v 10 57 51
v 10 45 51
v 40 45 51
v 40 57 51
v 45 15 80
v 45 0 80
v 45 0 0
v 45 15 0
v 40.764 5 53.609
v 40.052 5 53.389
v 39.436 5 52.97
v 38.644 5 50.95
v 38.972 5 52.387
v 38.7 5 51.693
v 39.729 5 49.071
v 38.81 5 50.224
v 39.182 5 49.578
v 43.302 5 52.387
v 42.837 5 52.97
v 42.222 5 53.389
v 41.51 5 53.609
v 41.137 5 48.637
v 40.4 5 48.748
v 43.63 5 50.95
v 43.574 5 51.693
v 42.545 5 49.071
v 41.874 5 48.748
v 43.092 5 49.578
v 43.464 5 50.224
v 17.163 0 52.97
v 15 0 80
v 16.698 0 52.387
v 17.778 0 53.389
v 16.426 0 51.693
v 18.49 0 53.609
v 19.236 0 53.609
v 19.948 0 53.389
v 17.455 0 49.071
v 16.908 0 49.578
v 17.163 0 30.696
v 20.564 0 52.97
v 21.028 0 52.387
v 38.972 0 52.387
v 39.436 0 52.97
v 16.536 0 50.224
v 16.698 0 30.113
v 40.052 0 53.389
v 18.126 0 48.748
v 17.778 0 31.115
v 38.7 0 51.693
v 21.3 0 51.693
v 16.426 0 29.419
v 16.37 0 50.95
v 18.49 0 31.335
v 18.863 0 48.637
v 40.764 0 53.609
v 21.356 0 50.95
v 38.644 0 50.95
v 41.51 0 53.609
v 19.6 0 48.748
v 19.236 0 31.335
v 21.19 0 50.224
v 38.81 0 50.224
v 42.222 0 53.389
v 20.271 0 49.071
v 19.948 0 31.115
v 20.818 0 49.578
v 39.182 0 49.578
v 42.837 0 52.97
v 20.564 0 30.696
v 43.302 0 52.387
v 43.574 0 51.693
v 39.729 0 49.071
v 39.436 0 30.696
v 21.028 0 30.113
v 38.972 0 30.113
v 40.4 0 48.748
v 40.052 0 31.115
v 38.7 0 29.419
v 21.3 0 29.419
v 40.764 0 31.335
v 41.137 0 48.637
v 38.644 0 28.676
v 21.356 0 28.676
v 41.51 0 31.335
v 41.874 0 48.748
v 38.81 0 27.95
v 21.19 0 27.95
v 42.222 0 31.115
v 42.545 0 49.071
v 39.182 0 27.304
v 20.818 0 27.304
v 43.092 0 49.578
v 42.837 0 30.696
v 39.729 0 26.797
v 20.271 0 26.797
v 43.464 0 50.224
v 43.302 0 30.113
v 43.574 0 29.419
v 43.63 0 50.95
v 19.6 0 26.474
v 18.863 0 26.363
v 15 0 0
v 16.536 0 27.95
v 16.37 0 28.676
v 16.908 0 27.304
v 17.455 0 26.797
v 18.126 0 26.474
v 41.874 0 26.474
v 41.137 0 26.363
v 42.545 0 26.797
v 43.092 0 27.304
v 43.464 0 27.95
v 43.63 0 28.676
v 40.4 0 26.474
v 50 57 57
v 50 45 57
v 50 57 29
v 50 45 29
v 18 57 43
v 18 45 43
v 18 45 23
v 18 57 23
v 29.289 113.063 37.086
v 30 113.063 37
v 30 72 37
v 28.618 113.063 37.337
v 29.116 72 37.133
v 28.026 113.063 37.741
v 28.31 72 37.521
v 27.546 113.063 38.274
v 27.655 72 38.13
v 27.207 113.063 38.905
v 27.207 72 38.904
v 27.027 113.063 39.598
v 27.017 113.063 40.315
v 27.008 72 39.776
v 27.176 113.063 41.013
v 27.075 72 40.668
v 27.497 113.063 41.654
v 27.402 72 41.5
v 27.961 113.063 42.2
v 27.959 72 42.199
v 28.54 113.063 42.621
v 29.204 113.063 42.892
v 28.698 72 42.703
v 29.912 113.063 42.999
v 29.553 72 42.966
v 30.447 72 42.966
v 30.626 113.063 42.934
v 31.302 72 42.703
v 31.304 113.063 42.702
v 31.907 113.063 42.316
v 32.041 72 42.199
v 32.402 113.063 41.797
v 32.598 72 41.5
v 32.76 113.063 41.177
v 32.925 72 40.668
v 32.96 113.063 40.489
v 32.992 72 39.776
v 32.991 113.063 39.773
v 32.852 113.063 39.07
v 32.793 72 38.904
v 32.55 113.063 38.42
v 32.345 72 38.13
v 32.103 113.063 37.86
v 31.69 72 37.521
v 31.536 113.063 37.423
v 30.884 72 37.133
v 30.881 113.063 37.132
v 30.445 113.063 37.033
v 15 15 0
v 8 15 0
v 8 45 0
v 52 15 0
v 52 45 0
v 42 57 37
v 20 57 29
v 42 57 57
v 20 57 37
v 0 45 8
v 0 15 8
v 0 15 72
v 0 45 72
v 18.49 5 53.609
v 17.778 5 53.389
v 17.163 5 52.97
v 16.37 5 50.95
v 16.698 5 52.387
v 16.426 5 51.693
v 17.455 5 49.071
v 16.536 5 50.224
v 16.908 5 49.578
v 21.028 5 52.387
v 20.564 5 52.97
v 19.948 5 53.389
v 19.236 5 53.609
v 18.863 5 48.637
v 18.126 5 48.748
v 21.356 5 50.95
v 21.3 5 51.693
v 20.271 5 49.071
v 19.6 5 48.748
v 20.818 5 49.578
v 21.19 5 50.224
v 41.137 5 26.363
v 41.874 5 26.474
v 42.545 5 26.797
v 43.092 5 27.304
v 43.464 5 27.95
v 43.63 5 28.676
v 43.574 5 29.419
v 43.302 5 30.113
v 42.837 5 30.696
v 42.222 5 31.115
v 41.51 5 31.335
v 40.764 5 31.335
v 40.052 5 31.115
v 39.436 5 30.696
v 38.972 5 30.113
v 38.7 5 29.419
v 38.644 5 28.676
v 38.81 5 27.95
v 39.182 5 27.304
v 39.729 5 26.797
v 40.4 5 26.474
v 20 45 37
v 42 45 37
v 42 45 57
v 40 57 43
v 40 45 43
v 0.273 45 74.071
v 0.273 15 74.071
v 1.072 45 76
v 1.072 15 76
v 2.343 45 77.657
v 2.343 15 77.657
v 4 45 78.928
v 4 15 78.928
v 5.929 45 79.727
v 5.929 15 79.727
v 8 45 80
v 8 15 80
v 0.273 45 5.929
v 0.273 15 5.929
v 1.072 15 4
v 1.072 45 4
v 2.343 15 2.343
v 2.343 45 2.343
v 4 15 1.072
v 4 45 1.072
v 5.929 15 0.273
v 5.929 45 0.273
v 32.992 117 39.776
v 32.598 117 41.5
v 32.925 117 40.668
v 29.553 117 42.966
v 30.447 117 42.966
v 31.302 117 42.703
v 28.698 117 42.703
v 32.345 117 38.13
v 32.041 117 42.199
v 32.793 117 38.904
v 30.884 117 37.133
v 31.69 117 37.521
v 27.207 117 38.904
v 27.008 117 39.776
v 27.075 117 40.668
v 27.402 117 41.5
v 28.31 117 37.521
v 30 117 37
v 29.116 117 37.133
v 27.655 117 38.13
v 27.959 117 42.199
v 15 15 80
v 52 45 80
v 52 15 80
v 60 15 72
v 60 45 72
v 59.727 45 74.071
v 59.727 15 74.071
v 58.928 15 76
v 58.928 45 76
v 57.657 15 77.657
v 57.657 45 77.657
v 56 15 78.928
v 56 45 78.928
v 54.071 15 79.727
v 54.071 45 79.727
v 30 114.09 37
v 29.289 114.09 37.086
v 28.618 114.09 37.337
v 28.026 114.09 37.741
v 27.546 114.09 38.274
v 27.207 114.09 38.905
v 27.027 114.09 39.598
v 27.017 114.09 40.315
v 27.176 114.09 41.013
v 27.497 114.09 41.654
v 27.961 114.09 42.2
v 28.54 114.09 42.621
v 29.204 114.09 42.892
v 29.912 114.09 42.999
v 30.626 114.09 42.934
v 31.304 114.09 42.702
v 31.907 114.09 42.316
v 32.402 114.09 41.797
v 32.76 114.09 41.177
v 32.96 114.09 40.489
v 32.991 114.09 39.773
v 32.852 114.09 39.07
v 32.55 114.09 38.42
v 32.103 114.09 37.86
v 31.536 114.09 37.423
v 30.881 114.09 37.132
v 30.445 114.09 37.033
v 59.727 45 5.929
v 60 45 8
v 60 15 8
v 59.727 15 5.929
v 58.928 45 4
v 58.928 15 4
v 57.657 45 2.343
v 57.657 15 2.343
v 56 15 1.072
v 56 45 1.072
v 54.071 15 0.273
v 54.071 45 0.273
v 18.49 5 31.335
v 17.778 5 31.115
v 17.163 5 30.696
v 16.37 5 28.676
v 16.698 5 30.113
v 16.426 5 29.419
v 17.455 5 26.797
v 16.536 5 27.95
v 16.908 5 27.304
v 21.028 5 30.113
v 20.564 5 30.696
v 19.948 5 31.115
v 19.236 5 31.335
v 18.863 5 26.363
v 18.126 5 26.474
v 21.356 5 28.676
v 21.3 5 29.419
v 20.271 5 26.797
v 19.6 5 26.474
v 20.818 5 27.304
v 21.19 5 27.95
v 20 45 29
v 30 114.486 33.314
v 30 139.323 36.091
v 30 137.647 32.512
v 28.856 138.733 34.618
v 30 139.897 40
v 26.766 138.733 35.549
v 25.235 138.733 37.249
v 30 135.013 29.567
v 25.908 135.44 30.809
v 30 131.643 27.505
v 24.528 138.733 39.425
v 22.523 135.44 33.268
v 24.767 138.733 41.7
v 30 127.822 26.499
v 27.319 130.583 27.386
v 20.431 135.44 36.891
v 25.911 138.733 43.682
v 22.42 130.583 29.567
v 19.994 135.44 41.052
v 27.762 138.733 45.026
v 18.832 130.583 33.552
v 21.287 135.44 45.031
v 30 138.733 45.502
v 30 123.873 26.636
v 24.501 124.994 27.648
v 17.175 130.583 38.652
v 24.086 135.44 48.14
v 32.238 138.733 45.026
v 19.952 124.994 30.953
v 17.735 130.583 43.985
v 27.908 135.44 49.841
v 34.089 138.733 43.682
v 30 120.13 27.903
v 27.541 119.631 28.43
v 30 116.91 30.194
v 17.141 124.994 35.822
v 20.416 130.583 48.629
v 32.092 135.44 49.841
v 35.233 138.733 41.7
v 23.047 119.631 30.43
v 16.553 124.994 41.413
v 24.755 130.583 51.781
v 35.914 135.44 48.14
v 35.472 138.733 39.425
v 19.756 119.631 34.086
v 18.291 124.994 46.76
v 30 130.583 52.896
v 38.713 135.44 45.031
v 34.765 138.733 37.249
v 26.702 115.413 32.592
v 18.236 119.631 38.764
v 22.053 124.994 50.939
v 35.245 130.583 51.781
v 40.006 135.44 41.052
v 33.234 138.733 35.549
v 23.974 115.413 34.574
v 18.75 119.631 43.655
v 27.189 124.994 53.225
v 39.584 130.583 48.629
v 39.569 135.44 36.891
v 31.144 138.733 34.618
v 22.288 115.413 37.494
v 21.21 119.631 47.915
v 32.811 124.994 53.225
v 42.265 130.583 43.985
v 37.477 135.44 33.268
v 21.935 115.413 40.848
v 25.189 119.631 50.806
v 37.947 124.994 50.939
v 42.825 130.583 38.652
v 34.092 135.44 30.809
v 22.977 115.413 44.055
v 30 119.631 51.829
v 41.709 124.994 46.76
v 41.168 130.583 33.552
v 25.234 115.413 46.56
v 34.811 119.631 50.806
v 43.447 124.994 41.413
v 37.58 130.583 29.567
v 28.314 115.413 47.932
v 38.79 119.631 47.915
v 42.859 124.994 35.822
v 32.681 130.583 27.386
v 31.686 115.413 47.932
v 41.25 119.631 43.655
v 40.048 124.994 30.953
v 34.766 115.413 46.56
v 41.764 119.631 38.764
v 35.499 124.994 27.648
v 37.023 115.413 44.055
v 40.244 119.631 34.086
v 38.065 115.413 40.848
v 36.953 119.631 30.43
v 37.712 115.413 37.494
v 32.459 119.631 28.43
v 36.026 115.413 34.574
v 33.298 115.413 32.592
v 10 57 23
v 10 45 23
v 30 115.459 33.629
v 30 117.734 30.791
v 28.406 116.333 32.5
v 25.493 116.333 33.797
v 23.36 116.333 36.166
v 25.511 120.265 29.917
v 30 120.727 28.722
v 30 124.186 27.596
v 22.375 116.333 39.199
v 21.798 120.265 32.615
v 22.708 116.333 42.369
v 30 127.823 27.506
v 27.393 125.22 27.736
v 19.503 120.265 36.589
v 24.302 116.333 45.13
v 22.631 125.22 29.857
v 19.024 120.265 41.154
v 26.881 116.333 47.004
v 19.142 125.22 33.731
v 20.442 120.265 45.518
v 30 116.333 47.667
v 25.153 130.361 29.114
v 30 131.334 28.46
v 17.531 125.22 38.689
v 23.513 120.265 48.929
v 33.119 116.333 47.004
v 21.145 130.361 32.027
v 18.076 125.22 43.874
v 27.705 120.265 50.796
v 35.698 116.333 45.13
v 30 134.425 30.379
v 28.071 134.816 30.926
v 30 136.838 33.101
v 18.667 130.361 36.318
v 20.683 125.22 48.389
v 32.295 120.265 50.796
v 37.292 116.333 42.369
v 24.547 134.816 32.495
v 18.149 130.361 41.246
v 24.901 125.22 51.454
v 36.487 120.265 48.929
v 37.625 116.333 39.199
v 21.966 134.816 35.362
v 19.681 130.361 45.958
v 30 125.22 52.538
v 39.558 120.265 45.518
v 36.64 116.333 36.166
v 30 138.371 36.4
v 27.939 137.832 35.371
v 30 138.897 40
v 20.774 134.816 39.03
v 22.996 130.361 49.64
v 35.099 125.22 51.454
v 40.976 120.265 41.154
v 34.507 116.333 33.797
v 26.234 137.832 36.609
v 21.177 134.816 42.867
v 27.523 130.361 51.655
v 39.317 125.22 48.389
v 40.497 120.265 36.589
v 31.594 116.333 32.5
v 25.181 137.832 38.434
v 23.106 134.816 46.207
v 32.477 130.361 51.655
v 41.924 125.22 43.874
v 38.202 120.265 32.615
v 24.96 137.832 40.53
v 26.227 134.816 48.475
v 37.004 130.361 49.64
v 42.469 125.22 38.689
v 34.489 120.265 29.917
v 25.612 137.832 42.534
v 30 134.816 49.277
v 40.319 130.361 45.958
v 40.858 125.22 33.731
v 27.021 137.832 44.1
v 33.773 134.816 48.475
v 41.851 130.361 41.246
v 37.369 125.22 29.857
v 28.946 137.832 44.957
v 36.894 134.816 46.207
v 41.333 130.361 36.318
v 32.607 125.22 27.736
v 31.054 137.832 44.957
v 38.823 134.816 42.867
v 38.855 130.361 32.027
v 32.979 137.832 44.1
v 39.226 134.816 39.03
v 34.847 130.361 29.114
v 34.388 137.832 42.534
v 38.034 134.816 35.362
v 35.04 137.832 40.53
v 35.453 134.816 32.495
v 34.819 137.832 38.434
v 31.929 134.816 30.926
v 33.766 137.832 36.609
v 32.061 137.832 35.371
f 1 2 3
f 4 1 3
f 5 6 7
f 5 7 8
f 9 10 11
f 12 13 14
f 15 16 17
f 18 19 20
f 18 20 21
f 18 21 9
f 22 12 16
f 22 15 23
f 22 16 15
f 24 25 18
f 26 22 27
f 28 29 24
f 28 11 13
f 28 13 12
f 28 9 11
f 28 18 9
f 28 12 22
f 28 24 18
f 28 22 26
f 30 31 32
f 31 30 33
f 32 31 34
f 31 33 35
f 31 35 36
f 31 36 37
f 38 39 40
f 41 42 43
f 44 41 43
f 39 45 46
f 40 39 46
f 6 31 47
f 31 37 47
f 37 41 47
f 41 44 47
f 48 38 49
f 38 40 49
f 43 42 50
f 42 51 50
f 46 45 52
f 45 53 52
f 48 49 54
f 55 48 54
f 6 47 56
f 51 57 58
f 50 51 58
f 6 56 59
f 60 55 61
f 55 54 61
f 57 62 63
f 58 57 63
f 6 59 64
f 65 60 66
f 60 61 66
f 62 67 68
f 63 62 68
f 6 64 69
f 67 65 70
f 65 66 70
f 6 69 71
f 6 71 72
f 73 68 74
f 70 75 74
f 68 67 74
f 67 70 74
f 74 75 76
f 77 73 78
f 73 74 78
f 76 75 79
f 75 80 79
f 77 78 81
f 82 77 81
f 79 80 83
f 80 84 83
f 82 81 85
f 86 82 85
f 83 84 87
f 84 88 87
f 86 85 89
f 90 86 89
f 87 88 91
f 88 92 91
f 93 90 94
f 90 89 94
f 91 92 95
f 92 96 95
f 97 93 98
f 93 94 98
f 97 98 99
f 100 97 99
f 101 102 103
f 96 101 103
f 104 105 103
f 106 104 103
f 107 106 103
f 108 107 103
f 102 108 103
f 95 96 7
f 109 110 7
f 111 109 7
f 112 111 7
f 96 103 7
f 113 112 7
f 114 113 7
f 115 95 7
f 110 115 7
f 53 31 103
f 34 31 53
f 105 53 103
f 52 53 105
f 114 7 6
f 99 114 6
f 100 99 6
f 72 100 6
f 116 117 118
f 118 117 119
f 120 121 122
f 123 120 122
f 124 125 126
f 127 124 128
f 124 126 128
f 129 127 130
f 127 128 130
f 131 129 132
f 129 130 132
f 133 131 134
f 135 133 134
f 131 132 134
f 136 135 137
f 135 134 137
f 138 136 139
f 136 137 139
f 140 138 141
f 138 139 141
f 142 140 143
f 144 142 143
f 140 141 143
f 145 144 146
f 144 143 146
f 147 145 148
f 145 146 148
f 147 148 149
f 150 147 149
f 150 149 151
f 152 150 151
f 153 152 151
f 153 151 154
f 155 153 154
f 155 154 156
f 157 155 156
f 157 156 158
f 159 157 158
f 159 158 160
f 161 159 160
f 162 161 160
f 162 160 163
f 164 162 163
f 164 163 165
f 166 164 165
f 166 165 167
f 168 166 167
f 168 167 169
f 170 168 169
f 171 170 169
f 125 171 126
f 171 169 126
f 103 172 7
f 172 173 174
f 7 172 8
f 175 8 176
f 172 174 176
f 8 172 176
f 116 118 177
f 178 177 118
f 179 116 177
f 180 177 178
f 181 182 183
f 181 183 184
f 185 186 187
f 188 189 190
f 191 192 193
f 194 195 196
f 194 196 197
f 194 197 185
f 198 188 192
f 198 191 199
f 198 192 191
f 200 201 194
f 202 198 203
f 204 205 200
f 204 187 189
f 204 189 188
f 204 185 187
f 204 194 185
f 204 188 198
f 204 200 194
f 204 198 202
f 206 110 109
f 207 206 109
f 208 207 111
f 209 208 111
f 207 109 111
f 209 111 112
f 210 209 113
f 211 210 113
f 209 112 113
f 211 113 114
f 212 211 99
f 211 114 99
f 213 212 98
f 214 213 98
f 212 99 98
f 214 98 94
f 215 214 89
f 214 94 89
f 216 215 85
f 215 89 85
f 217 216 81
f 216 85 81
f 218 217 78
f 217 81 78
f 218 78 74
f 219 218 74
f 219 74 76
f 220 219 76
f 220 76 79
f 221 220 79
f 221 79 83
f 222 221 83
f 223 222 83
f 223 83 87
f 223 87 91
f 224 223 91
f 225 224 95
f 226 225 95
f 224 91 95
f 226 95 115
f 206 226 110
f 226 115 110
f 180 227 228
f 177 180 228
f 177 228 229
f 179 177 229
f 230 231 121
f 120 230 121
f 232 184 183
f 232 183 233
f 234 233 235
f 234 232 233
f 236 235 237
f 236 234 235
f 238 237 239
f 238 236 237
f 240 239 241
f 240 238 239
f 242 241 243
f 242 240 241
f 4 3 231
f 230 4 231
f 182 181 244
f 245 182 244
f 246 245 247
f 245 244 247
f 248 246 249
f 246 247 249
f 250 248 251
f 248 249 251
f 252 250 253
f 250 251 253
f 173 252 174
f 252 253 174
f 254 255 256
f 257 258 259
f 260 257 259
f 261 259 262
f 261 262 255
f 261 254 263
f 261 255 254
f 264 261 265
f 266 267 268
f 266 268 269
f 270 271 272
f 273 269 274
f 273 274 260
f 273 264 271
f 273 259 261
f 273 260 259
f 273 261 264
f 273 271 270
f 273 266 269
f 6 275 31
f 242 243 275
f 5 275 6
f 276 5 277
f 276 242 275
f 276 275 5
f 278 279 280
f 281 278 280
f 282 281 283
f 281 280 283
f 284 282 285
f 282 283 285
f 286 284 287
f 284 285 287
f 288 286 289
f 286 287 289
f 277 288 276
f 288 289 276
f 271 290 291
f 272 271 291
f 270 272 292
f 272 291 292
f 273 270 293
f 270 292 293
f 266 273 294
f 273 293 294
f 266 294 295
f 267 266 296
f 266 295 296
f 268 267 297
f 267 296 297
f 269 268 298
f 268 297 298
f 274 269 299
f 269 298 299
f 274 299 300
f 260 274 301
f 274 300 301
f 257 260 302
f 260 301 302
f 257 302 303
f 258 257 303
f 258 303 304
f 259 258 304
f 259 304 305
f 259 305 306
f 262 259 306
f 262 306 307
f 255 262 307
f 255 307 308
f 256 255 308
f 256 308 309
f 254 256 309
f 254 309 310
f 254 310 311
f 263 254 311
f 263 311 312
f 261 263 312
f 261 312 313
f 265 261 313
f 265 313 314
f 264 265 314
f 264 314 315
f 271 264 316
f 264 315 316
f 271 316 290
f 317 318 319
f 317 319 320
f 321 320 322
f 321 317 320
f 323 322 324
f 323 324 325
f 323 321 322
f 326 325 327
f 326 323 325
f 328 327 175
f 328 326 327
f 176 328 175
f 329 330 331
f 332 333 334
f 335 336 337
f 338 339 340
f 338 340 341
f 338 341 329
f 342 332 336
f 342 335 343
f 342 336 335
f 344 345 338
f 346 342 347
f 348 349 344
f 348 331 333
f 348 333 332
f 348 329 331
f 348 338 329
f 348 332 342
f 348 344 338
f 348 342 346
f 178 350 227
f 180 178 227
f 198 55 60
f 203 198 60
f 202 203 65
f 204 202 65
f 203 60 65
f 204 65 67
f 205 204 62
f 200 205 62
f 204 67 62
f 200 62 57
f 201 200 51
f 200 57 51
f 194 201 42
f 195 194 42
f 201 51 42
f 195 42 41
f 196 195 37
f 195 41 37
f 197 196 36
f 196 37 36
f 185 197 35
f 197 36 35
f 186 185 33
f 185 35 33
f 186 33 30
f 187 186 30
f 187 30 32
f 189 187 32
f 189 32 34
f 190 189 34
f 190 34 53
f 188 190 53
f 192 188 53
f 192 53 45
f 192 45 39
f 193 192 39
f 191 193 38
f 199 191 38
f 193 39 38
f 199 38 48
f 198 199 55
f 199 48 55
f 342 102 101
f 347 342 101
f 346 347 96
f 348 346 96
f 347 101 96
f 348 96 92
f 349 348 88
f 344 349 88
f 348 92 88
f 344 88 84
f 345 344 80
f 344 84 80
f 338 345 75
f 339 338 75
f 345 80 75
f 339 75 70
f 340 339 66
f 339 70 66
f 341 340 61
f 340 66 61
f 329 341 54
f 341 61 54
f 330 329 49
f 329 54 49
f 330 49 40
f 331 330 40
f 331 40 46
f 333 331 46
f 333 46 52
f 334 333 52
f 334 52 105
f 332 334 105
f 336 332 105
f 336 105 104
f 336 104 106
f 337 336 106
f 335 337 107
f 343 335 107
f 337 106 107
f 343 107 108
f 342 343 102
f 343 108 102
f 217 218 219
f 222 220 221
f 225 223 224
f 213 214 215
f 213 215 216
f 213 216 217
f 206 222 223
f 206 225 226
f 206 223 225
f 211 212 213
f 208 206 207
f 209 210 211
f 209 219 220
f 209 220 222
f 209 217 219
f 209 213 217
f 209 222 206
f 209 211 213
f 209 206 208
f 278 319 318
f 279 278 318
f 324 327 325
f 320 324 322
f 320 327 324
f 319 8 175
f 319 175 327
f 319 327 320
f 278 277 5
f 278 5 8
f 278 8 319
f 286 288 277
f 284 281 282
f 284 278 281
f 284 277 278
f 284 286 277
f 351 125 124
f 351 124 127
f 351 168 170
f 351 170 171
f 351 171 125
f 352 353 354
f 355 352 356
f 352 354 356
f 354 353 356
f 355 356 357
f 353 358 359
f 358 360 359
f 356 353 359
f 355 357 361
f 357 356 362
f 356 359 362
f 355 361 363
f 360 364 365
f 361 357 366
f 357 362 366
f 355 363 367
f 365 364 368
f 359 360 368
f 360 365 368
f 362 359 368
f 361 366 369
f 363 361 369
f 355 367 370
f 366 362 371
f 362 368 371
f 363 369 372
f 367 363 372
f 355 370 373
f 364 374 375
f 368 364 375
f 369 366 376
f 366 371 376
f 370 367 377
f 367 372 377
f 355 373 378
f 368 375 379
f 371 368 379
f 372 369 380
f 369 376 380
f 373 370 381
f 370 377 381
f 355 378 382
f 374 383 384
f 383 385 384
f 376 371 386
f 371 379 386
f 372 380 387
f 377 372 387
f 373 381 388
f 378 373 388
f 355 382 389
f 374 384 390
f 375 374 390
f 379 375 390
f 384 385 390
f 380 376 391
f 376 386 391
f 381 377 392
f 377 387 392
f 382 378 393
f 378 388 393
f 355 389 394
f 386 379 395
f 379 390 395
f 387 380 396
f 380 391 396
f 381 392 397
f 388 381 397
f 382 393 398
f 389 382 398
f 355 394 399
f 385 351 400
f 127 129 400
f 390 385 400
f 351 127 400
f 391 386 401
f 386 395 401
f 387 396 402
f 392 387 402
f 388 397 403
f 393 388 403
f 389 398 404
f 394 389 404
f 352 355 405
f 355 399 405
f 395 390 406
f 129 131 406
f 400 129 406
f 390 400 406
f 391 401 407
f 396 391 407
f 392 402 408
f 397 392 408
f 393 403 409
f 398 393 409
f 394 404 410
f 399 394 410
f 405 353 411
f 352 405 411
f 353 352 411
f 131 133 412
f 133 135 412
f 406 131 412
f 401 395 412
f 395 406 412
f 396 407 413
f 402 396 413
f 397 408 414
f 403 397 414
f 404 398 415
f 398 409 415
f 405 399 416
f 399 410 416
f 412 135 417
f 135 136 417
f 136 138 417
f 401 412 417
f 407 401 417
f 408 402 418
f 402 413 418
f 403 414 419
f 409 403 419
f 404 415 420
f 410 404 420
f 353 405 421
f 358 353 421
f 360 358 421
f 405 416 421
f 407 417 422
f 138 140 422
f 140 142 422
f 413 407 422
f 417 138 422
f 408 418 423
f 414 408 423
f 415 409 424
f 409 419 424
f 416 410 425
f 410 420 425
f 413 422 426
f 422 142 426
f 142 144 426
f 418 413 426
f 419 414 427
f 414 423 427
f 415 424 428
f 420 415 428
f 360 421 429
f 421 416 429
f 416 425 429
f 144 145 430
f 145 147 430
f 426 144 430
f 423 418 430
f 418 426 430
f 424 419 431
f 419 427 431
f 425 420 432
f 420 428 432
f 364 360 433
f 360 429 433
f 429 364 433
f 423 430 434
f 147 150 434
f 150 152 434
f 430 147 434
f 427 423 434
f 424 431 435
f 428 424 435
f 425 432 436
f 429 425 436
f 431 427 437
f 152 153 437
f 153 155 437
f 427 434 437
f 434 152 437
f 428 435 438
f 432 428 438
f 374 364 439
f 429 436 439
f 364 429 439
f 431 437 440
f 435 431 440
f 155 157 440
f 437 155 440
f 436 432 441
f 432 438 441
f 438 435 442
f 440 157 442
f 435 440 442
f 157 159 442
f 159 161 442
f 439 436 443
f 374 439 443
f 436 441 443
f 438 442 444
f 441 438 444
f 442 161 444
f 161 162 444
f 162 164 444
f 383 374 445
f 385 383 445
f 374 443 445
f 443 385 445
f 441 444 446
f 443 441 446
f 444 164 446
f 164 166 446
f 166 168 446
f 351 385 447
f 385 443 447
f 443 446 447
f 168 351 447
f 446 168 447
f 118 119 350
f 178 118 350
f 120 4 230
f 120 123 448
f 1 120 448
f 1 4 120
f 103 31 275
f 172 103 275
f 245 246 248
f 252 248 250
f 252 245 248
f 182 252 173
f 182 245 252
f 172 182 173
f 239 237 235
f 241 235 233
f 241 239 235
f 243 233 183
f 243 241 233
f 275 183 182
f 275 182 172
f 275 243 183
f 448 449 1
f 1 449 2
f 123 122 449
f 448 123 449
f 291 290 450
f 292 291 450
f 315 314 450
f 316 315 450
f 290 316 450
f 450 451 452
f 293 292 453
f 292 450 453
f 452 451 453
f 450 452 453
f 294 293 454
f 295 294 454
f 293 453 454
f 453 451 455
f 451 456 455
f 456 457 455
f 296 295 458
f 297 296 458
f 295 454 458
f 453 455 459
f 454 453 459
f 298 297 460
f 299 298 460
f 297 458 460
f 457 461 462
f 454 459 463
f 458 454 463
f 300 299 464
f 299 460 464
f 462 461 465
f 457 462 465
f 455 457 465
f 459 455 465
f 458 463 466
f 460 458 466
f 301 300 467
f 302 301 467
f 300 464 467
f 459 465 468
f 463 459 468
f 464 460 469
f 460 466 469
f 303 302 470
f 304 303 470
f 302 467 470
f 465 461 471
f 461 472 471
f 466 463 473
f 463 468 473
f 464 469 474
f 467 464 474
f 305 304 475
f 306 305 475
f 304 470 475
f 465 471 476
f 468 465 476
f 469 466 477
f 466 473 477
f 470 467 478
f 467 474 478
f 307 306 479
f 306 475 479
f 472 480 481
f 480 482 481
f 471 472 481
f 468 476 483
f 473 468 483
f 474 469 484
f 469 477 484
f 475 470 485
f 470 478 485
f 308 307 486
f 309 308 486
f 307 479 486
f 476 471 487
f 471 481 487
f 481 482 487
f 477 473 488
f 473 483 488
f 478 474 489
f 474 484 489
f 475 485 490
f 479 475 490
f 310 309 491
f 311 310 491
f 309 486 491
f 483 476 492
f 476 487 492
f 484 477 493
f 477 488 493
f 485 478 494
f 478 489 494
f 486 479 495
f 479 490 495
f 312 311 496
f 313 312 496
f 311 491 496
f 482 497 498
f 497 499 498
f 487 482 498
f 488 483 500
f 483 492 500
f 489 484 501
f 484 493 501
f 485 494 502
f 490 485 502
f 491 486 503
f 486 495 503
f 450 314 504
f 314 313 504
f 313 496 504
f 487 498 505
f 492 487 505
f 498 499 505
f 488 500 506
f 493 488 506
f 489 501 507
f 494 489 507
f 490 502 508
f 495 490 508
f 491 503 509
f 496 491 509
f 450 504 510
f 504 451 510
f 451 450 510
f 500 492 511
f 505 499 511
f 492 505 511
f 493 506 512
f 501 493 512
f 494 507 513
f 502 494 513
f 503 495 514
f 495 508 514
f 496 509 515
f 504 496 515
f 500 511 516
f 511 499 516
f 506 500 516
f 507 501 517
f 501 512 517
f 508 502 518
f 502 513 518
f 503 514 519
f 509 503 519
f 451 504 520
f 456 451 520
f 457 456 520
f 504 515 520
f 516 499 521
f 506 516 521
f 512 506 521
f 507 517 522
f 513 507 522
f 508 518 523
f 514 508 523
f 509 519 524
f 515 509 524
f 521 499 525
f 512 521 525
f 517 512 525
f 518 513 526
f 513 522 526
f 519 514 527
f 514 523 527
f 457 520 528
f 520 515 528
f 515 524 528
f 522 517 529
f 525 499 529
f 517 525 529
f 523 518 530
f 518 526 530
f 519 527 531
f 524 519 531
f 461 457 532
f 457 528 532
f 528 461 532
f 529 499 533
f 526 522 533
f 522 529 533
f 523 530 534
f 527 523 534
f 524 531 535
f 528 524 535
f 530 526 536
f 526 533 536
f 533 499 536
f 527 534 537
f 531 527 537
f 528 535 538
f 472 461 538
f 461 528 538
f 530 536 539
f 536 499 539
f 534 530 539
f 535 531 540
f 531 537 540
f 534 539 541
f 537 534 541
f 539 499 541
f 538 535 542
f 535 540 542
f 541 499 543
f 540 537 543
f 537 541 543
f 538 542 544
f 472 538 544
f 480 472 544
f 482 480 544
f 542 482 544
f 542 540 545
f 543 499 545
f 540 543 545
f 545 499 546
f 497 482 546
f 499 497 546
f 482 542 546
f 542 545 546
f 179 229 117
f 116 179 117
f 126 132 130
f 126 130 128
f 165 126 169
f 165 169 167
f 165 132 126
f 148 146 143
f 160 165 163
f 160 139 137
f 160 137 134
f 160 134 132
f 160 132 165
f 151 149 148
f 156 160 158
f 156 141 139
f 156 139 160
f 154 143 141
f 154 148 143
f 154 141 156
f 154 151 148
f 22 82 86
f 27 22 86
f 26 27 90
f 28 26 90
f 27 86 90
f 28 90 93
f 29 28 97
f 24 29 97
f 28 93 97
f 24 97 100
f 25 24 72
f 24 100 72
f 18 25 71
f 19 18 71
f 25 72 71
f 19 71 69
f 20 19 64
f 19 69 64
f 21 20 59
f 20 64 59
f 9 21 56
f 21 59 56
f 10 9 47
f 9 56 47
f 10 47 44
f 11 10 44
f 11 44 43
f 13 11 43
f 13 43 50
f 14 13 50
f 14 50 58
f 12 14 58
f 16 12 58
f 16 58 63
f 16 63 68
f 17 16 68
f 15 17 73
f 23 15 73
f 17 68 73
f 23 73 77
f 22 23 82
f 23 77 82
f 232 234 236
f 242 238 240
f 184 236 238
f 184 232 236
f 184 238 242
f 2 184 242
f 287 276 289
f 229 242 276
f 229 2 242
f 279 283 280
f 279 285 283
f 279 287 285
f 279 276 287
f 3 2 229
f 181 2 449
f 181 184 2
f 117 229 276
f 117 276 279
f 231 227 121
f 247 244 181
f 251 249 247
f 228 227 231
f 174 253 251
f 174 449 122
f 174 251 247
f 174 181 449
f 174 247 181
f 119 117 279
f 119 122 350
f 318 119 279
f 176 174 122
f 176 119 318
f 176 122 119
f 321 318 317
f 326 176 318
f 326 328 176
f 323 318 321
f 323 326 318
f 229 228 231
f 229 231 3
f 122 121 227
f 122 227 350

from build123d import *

# Parameters (mm, degrees)
SKETCH_1_W          = 60
SKETCH_1_H          = 45
EXTRUDE_1_DEPTH     = 80
FILLET_1_R          = 8
SKETCH_2_W          = 15
SKETCH_2_H          = 15
CUT_EXTRUDE_1_DEPTH = 110.658560997
SKETCH_3_R          = 2.5
CUT_EXTRUDE_2_DEPTH = 5
EXTRUDE_2_DEPTH     = 12
SKETCH_5_R          = 3
EXTRUDE_4_DEPTH     = 60
SKETCH_7_W          = 9.920530886
SKETCH_7_H          = 15
CUT_EXTRUDE_3_DEPTH = 60


with BuildPart() as part:
    # ｽｹｯﾁ1 → 押し出し1 (new body)
    with BuildSketch(Plane.XY):
        with Locations((30, 22.5)):
            Rectangle(SKETCH_1_W, SKETCH_1_H)
    extrude(amount=EXTRUDE_1_DEPTH)

    # ﾌｨﾚｯﾄ1
    fillet_1_edges = [part.edges().sort_by_distance(p)[0] for p in [
        (60, 22.5, 80),
        (0, 22.5, 80),
        (60, 22.5, 0),
        (0, 22.5, 0),
    ]]
    fillet(fillet_1_edges, radius=FILLET_1_R)

    # ｽｹｯﾁ2 → ｶｯﾄ - 押し出し1 (cut, through all)
    with BuildSketch(Plane.XY.offset(80)):
        with Locations((52.5, 7.5)):
            Rectangle(SKETCH_2_W, SKETCH_2_H)
        with Locations((7.5, 7.5)):
            Rectangle(SKETCH_2_W, SKETCH_2_H)
    extrude(amount=-CUT_EXTRUDE_1_DEPTH, mode=Mode.SUBTRACT)

    # ｽｹｯﾁ3 → ｶｯﾄ - 押し出し2 (cut)
    with BuildSketch(Plane.XZ):
        with Locations(Location((41.136931804, 51.136931804, 0), (0, 0, 270))):
            Circle(SKETCH_3_R)
        with Locations(Location((41.136931804, 28.863068196, 0), (0, 0, 270))):
            Circle(SKETCH_3_R)
        with Locations(Location((18.863068196, 51.136931804, 0), (0, 0, 270))):
            Circle(SKETCH_3_R)
        with Locations(Location((18.863068196, 28.863068196, 0), (0, 0, 270))):
            Circle(SKETCH_3_R)
    extrude(amount=-CUT_EXTRUDE_2_DEPTH, mode=Mode.SUBTRACT)

    # ｽｹｯﾁ4 → 押し出し2 (add)
    with BuildSketch(Plane(origin=(0, 45, 0), x_dir=(-1, 0, 0), z_dir=(0, 1, 0))):
        Polygon((-50, 29), (-20, 29), (-20, 37), (-42, 37), (-42, 57), (-50, 57), align=None)
        Polygon((-10, 23), (-10, 51), (-40, 51), (-40, 43), (-18, 43), (-18, 23), align=None)
    extrude(amount=EXTRUDE_2_DEPTH)


with BuildPart() as body_2:
    # ｽｹｯﾁ5 → 押し出し4 (new body)
    with BuildSketch(Plane(origin=(0, 57, 0), x_dir=(-1, 0, 0), z_dir=(0, 1, 0))):
        with Locations(Location((-30, 40, 0), (0, 0, 270))):
            Circle(SKETCH_5_R)
    extrude(amount=EXTRUDE_4_DEPTH)

    # ｽｹｯﾁ7 → ｶｯﾄ - 押し出し3 (cut)
    with BuildSketch(Plane.XY.offset(51)):
        with Locations((29.960265443, 64.5)):
            Rectangle(SKETCH_7_W, SKETCH_7_H)
    extrude(amount=-CUT_EXTRUDE_3_DEPTH, mode=Mode.SUBTRACT)

    # ｽｹｯﾁ9 → 回転-薄板2 (revolve)
    with BuildSketch(Plane.XY.offset(40), mode=Mode.PRIVATE) as revolve_2_sk:
        with BuildLine():
            ThreePointArc((30.159583172, 113.728184189), (42.584755395, 126.391973903), (30, 138.897189069))
            Line((30, 138.897189069), (30, 139.897189069))
            ThreePointArc((30, 139.897189069), (43.584735295, 126.39831424), (30.17226359, 112.728264589))
            Line((30.17226359, 112.728264589), (30.159583172, 113.728184189))
        make_face()
    revolve(revolve_2_sk.sketch.rotate(Axis((30, 117, 40), (0, 1, 0)), 90), axis=Axis((30, 117, 40), (0, 1, 0)))


solid = Compound([part.part, body_2.part])
